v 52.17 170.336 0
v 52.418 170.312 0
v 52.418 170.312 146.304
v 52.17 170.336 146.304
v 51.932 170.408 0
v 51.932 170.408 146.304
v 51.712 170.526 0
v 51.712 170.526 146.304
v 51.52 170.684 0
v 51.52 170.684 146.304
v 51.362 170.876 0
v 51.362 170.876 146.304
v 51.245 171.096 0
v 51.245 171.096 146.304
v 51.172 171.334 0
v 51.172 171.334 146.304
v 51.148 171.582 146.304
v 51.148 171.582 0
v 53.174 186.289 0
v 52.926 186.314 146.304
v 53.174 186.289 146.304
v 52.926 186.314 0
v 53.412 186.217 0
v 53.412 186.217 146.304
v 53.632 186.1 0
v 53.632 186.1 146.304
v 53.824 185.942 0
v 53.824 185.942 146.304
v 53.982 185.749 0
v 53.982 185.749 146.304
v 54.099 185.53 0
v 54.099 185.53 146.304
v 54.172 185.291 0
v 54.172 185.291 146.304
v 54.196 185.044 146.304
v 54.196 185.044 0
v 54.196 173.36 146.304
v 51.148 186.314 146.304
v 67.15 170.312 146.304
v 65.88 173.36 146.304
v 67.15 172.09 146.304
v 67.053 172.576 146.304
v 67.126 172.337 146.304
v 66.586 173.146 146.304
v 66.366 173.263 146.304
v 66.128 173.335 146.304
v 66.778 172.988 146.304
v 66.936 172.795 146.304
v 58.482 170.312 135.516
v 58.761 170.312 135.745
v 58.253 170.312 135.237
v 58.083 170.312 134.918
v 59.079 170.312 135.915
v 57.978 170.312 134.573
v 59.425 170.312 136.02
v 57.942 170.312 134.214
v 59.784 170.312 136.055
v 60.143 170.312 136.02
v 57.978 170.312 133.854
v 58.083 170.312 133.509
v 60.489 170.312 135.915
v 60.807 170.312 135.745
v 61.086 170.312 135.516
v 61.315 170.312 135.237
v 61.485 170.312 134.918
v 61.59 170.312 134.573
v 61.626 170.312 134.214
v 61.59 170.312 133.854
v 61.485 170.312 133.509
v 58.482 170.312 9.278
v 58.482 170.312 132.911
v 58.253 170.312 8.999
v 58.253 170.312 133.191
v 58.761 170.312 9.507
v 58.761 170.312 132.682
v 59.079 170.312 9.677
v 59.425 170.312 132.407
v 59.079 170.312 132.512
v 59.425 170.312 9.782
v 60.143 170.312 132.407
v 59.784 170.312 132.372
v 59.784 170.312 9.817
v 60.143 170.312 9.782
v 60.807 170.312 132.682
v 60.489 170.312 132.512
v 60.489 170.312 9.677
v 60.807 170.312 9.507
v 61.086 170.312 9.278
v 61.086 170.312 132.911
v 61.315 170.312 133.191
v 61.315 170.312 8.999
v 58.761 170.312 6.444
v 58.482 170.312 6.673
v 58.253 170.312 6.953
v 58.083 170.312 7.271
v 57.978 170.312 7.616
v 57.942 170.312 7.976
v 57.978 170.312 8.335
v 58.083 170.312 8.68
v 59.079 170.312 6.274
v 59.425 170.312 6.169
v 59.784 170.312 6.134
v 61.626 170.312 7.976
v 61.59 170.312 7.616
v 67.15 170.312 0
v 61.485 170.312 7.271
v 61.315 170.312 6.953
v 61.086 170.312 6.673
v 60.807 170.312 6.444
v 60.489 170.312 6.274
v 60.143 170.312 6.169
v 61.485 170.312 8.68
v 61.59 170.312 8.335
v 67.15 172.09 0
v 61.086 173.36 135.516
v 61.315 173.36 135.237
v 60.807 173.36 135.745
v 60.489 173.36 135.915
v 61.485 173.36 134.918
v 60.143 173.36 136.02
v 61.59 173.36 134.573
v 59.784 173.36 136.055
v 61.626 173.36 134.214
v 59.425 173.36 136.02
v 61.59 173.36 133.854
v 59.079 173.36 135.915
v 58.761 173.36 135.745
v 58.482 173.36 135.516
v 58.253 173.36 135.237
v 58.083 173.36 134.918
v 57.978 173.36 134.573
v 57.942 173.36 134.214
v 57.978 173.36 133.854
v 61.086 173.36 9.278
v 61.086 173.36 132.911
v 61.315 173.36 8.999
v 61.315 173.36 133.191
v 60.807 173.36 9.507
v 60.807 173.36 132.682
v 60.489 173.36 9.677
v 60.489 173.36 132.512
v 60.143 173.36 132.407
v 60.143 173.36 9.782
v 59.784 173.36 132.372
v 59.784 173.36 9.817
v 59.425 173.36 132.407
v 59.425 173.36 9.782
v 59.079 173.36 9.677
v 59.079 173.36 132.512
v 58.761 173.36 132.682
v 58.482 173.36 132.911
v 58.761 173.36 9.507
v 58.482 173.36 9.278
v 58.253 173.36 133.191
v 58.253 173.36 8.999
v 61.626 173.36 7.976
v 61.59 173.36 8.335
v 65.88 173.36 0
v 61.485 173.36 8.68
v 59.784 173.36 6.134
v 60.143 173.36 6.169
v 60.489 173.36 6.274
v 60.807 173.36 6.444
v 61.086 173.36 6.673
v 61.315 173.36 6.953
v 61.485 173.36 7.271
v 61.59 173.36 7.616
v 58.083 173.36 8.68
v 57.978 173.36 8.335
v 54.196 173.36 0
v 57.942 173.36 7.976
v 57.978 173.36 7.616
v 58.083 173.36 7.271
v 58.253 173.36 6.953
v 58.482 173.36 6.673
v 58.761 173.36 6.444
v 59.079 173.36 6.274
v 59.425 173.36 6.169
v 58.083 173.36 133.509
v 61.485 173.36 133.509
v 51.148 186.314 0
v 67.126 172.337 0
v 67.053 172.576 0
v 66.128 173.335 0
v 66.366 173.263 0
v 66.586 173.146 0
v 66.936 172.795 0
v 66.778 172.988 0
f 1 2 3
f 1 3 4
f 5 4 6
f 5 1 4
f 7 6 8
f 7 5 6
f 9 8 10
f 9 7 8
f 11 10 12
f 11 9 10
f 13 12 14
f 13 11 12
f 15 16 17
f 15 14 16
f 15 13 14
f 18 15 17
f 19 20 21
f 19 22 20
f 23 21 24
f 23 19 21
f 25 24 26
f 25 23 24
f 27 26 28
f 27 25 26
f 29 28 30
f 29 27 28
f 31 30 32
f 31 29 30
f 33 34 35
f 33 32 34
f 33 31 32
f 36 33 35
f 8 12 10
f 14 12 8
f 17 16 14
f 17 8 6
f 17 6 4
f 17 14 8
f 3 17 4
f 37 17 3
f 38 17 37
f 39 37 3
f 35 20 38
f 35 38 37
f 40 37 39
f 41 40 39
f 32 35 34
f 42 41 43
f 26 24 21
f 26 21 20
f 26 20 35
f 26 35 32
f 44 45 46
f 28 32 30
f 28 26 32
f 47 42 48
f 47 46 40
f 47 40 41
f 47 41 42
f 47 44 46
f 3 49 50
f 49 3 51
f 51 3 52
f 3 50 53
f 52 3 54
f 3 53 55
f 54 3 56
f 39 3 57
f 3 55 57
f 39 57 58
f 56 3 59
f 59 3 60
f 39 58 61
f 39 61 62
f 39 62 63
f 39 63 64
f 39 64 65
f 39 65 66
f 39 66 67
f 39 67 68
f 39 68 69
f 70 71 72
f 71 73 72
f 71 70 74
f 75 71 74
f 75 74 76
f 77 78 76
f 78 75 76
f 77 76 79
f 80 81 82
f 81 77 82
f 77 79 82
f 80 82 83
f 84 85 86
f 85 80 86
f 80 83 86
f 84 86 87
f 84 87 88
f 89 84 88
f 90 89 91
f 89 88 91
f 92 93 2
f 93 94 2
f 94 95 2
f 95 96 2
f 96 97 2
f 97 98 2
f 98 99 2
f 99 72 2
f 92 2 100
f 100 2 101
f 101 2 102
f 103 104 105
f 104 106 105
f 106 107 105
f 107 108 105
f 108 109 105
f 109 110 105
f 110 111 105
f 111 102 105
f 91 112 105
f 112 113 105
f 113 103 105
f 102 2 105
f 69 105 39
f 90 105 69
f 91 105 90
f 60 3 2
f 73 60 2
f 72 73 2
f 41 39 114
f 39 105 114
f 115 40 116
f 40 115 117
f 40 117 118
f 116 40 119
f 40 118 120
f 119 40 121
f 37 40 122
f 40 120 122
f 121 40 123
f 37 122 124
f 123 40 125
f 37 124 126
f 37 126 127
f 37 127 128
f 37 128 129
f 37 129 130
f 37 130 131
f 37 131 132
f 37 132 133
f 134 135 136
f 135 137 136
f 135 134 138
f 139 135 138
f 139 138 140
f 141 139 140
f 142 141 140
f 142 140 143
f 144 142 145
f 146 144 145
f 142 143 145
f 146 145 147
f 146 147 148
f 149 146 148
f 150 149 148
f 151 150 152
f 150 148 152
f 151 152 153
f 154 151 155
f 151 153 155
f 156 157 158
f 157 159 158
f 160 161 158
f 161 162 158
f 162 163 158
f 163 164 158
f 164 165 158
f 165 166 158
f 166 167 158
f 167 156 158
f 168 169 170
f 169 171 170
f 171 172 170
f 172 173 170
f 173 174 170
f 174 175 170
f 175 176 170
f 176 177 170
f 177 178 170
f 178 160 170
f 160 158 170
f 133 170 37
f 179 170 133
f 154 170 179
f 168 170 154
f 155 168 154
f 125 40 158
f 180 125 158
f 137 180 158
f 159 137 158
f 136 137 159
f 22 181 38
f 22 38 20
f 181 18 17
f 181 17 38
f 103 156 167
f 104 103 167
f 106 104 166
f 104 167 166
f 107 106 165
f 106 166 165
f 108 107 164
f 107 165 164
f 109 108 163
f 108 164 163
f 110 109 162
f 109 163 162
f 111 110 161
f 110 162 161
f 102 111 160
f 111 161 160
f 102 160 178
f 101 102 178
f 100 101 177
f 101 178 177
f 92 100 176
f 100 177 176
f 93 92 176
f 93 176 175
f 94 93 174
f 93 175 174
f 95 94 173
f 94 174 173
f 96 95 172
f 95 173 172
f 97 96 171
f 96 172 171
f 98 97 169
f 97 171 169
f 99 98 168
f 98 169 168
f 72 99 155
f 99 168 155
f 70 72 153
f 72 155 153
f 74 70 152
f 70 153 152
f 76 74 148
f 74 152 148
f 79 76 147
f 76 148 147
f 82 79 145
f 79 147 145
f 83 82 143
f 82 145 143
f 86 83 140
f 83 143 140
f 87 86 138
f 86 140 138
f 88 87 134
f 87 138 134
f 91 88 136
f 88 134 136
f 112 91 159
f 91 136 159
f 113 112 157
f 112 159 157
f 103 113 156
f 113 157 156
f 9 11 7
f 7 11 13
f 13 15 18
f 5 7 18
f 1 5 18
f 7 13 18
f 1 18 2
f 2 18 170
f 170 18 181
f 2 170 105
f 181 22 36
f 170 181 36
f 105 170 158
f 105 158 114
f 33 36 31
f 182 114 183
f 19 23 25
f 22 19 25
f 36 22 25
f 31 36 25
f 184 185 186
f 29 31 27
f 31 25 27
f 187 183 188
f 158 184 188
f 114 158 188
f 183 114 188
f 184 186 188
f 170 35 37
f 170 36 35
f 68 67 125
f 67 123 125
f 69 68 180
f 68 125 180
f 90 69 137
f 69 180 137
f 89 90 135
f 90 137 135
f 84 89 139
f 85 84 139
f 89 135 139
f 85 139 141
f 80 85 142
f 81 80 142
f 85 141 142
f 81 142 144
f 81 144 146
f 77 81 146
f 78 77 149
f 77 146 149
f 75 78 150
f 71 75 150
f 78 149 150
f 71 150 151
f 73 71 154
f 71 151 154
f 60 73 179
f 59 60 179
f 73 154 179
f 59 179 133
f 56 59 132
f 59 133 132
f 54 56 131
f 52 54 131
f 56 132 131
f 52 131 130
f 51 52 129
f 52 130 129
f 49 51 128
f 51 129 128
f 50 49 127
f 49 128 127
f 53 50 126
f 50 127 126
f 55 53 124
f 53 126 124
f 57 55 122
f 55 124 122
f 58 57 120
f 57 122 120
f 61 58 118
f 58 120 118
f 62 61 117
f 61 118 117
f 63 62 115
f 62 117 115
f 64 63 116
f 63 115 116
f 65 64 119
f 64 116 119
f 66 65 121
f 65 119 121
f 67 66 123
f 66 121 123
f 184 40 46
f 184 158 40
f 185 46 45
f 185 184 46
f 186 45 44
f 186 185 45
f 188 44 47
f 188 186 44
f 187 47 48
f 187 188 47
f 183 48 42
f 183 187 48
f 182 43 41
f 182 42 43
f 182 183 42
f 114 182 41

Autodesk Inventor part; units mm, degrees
ref_plane "YZ Plane" through (0, 0, 0) normal (1, 0, 0) x (0, 1, 0)
ref_plane "XZ Plane" through (0, 0, 0) normal (0, 1, 0) x (-1, 0, 0)
ref_plane "XY Plane" through (0, 0, 0) normal (0, 0, 1) x (1, 0, 0)
sketch "Sketch1" plane through (0, 0, 0) normal (0, 0, 1) x (1, 0, 0)
  line L0 (52.418, 170.3116) -> (67.15, 170.3116)
  line L1 (67.15, 170.3116) -> (67.15, 167.2636)
  line L2 (51.148, 171.5816) -> (51.148, 186.3136)
  line L3 (51.148, 186.3136) -> (52.926, 186.3136)
  line L4 (54.196, 185.0436) -> (54.196, 173.3596)
  line L5 (67.15, 170.3116) -> (67.15, 172.0896)
  line L6 (65.88, 173.3596) -> (54.196, 173.3596)
  arc A0 (54.196, 185.0436) -> (52.926, 186.3136) centre (52.926, 185.0436) ccw
  arc A1 (67.15, 172.0896) -> (65.88, 173.3596) centre (65.88, 172.0896) ccw
  arc A2 (51.148, 171.5816) -> (52.418, 170.3116) centre (52.418, 171.5816) ccw
  point P0 (0, 0)
  point P1 (51.148, 170.3116)
  point P2 (54.196, 186.3136)
  point P3 (67.15, 173.3596)
  dimension "d0" = 16.002
  dimension "d1" = 3.048
  dimension "d2" = 16.002
  dimension "d3" = 3.048
  dimension "d4" = 3.048
  dimension "d5" = 1.27
  dimension "d6" = 1.27
extrude "Extrusion1" add sketch "Sketch1" along normal blind 146.304
sketch "Sketch3" plane through (54.196, 173.3596, 0) normal (0, 1, 0) x (1, 0, 0)
  line L0 (0.9375, 6.2475) -> (13.2819, 6.2475)
  line L1 (12.954, 0) -> (-1.778, 0) projected
  line L2 (5.588, 0) -> (5.588, -6.1341)
  line L3 (-1.778, -146.304) -> (12.954, -146.304) projected
  circle A0 centre (5.588, -7.9756) radius 1.8415
  line L4 (5.588, -7.9756) -> (5.588, -130.5306)
  circle A1 centre (5.588, -134.2136) radius 1.8415
  point P0 (-54.196, 0)
  dimension "d31" = 12.3444
  dimension "d32" = 6.1341
  dimension "d38" = 122.555
extrude "Extrusion6" cut sketch "Sketch3" against normal blind 69.85
